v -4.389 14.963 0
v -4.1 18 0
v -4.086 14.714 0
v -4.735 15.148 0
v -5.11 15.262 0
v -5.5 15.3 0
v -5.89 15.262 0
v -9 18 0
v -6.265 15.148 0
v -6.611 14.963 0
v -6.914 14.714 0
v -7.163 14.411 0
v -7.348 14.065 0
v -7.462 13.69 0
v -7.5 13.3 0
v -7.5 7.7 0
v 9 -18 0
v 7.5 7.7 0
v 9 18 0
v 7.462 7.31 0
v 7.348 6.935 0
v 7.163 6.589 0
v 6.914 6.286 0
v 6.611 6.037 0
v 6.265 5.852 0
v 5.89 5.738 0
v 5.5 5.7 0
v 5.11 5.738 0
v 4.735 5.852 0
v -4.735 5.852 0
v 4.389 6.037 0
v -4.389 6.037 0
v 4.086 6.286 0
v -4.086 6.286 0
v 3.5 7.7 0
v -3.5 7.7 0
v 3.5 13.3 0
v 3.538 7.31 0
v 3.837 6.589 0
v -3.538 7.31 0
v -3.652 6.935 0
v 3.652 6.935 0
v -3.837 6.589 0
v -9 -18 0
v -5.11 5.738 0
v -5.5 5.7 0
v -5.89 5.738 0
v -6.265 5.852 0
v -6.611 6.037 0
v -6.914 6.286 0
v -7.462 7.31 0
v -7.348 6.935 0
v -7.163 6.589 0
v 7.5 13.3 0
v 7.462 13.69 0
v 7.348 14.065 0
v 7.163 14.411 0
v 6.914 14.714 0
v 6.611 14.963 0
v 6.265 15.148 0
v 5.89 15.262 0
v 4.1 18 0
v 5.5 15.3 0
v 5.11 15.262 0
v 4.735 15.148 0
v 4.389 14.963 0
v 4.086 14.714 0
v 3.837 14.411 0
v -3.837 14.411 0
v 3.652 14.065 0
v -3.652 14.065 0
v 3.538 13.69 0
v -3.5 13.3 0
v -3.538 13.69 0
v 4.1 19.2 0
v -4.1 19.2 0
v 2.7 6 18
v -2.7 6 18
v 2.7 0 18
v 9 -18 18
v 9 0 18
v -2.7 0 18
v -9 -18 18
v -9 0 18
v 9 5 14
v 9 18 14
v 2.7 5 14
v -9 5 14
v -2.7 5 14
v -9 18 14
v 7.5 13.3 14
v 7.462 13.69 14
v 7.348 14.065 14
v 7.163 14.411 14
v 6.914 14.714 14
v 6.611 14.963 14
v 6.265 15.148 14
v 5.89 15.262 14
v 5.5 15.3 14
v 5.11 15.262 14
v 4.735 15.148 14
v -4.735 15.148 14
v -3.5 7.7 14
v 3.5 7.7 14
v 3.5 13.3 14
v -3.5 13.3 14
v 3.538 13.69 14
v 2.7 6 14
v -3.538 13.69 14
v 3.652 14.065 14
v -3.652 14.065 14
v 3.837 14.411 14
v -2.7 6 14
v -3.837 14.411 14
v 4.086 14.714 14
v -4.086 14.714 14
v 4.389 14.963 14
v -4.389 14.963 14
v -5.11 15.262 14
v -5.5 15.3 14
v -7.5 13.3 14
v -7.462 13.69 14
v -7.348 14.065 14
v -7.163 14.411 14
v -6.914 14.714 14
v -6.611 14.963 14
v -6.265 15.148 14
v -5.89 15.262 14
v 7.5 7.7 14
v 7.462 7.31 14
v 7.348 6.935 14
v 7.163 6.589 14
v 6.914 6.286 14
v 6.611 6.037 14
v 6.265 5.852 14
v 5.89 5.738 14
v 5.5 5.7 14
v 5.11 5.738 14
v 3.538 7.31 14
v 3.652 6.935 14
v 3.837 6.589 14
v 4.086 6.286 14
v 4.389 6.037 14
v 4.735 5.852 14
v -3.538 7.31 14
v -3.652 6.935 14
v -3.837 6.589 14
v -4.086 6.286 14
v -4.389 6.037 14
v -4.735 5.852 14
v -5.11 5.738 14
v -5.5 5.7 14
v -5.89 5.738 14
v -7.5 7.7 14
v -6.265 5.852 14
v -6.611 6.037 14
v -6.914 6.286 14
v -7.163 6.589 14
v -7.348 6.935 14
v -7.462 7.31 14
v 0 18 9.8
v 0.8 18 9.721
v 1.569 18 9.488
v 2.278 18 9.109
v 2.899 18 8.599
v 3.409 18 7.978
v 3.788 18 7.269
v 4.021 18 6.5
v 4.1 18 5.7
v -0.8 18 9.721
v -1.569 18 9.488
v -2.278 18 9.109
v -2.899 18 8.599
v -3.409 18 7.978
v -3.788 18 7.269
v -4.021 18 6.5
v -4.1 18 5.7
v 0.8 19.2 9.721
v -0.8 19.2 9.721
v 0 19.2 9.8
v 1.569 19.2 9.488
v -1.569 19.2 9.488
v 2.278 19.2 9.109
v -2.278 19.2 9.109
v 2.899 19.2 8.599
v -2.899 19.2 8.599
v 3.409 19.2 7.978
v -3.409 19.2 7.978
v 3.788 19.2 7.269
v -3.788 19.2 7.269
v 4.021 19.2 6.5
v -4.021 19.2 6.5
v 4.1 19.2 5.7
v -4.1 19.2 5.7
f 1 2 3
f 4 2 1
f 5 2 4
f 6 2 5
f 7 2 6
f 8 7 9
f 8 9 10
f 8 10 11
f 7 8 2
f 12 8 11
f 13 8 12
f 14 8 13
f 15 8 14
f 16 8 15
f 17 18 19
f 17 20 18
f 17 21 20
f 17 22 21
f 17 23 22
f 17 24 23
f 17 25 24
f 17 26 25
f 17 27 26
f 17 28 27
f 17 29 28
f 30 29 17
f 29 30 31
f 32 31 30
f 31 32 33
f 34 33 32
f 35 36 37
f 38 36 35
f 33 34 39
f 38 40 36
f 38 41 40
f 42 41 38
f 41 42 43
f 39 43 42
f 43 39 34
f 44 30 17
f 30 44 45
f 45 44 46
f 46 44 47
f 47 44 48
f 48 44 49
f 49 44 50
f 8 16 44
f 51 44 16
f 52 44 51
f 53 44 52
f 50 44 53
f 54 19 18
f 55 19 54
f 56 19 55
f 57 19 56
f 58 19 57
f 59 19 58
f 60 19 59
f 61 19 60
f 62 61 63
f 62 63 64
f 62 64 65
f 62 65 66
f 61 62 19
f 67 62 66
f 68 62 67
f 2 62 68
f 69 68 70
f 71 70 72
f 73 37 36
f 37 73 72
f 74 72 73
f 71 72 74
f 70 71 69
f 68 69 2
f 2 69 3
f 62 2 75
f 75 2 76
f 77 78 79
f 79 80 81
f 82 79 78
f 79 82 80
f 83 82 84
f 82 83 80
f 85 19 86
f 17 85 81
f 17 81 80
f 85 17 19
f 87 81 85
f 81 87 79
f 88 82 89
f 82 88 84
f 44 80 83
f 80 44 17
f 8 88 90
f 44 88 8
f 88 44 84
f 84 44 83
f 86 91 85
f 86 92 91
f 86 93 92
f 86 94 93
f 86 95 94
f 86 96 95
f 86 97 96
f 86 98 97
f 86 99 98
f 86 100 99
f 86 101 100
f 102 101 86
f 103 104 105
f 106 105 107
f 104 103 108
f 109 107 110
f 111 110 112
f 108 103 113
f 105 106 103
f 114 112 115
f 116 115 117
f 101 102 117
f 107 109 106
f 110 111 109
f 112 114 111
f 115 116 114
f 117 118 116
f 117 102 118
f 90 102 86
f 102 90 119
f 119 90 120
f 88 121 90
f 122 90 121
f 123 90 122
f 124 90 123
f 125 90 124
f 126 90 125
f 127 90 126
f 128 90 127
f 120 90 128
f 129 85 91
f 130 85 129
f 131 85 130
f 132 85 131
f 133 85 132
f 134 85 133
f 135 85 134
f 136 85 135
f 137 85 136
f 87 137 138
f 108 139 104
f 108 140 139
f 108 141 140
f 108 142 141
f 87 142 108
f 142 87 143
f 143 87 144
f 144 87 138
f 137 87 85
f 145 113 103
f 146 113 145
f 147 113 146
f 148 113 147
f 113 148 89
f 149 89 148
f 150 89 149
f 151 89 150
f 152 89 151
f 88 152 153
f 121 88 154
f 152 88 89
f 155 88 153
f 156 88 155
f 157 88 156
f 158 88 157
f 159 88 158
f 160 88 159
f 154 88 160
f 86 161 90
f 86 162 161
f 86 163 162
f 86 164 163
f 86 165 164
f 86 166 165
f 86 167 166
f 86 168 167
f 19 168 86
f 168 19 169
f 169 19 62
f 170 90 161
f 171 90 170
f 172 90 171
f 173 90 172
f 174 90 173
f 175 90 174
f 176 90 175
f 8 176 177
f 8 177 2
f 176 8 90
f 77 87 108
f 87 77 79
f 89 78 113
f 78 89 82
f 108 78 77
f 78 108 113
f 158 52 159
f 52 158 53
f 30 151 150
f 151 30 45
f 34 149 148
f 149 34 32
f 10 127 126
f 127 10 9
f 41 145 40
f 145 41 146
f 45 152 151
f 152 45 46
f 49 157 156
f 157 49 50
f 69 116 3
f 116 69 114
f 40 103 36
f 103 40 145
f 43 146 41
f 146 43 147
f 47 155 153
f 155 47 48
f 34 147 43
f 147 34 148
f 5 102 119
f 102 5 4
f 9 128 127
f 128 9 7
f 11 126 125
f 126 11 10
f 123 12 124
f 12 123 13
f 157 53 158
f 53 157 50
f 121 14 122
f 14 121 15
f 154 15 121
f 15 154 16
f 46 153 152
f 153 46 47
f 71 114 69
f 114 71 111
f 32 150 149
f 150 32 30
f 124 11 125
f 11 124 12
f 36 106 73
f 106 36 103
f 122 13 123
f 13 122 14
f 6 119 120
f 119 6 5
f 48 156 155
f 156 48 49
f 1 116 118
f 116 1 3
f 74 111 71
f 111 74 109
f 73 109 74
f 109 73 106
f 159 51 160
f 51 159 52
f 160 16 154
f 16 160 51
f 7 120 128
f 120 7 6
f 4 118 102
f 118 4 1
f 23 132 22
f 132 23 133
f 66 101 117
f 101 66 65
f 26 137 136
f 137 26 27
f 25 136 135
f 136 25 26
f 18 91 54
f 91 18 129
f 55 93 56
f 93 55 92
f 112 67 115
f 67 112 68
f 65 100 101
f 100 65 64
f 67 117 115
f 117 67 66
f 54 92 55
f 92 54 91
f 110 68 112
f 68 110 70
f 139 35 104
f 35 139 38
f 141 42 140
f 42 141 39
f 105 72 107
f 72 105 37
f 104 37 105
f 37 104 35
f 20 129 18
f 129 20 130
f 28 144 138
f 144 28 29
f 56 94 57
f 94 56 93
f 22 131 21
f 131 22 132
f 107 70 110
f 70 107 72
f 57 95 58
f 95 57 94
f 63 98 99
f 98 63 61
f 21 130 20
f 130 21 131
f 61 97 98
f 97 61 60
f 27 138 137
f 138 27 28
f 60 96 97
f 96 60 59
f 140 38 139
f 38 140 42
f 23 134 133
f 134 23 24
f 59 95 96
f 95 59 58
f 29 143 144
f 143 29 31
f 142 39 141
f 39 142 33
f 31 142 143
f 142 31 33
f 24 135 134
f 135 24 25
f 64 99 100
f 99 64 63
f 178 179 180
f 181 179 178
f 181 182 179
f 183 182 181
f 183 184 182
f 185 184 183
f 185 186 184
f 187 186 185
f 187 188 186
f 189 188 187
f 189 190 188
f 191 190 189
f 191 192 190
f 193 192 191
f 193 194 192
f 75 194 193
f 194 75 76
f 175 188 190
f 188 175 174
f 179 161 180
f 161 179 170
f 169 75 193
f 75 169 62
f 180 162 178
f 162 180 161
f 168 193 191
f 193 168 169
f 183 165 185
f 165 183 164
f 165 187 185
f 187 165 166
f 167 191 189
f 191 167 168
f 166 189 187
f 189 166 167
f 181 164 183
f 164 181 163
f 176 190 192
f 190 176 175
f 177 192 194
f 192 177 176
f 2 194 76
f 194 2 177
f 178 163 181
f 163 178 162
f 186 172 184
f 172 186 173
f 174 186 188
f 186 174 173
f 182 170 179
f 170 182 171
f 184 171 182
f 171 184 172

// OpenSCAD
$fn = 32;

translate([0, 0, 9]) proximity_sensor_sn04();

module proximity_sensor_sn04() {
    difference() {
        union() {
            hull() {
                translate([0, -9, 0]) cube([18, 18, 18], center = true);
                translate([0, 4.5, -2]) cube([18, 1, 14], center = true);
            }
            translate([0, 11.5, -2]) cube([18, 13, 14], center = true);
            translate([0, 3, 0]) cube([5.4, 6, 18], center = true);
        }
        for(x = [-5.5, 5.5]) translate([x, 10.5, 0])
            hull() {
                translate([0, -2.8, 0]) cylinder(r = 2, h = 20, center = true);
                translate([0,  2.8, 0]) cylinder(r = 2, h = 20, center = true);
            }  
    }

    hull() {
        translate([0, 19.2, -9.8/2+1.6]) rotate([90, 0, 0]) cylinder(d = 8.2, h = 1.2);
        translate([0, 18.6, -7]) cube([8.2, 1.2, 4], center = true);
    }

    % translate([0, 25, -9.8/2+1.6]) rotate([90, 0, 0]) cylinder(d = 3.5, h = 7);
}
